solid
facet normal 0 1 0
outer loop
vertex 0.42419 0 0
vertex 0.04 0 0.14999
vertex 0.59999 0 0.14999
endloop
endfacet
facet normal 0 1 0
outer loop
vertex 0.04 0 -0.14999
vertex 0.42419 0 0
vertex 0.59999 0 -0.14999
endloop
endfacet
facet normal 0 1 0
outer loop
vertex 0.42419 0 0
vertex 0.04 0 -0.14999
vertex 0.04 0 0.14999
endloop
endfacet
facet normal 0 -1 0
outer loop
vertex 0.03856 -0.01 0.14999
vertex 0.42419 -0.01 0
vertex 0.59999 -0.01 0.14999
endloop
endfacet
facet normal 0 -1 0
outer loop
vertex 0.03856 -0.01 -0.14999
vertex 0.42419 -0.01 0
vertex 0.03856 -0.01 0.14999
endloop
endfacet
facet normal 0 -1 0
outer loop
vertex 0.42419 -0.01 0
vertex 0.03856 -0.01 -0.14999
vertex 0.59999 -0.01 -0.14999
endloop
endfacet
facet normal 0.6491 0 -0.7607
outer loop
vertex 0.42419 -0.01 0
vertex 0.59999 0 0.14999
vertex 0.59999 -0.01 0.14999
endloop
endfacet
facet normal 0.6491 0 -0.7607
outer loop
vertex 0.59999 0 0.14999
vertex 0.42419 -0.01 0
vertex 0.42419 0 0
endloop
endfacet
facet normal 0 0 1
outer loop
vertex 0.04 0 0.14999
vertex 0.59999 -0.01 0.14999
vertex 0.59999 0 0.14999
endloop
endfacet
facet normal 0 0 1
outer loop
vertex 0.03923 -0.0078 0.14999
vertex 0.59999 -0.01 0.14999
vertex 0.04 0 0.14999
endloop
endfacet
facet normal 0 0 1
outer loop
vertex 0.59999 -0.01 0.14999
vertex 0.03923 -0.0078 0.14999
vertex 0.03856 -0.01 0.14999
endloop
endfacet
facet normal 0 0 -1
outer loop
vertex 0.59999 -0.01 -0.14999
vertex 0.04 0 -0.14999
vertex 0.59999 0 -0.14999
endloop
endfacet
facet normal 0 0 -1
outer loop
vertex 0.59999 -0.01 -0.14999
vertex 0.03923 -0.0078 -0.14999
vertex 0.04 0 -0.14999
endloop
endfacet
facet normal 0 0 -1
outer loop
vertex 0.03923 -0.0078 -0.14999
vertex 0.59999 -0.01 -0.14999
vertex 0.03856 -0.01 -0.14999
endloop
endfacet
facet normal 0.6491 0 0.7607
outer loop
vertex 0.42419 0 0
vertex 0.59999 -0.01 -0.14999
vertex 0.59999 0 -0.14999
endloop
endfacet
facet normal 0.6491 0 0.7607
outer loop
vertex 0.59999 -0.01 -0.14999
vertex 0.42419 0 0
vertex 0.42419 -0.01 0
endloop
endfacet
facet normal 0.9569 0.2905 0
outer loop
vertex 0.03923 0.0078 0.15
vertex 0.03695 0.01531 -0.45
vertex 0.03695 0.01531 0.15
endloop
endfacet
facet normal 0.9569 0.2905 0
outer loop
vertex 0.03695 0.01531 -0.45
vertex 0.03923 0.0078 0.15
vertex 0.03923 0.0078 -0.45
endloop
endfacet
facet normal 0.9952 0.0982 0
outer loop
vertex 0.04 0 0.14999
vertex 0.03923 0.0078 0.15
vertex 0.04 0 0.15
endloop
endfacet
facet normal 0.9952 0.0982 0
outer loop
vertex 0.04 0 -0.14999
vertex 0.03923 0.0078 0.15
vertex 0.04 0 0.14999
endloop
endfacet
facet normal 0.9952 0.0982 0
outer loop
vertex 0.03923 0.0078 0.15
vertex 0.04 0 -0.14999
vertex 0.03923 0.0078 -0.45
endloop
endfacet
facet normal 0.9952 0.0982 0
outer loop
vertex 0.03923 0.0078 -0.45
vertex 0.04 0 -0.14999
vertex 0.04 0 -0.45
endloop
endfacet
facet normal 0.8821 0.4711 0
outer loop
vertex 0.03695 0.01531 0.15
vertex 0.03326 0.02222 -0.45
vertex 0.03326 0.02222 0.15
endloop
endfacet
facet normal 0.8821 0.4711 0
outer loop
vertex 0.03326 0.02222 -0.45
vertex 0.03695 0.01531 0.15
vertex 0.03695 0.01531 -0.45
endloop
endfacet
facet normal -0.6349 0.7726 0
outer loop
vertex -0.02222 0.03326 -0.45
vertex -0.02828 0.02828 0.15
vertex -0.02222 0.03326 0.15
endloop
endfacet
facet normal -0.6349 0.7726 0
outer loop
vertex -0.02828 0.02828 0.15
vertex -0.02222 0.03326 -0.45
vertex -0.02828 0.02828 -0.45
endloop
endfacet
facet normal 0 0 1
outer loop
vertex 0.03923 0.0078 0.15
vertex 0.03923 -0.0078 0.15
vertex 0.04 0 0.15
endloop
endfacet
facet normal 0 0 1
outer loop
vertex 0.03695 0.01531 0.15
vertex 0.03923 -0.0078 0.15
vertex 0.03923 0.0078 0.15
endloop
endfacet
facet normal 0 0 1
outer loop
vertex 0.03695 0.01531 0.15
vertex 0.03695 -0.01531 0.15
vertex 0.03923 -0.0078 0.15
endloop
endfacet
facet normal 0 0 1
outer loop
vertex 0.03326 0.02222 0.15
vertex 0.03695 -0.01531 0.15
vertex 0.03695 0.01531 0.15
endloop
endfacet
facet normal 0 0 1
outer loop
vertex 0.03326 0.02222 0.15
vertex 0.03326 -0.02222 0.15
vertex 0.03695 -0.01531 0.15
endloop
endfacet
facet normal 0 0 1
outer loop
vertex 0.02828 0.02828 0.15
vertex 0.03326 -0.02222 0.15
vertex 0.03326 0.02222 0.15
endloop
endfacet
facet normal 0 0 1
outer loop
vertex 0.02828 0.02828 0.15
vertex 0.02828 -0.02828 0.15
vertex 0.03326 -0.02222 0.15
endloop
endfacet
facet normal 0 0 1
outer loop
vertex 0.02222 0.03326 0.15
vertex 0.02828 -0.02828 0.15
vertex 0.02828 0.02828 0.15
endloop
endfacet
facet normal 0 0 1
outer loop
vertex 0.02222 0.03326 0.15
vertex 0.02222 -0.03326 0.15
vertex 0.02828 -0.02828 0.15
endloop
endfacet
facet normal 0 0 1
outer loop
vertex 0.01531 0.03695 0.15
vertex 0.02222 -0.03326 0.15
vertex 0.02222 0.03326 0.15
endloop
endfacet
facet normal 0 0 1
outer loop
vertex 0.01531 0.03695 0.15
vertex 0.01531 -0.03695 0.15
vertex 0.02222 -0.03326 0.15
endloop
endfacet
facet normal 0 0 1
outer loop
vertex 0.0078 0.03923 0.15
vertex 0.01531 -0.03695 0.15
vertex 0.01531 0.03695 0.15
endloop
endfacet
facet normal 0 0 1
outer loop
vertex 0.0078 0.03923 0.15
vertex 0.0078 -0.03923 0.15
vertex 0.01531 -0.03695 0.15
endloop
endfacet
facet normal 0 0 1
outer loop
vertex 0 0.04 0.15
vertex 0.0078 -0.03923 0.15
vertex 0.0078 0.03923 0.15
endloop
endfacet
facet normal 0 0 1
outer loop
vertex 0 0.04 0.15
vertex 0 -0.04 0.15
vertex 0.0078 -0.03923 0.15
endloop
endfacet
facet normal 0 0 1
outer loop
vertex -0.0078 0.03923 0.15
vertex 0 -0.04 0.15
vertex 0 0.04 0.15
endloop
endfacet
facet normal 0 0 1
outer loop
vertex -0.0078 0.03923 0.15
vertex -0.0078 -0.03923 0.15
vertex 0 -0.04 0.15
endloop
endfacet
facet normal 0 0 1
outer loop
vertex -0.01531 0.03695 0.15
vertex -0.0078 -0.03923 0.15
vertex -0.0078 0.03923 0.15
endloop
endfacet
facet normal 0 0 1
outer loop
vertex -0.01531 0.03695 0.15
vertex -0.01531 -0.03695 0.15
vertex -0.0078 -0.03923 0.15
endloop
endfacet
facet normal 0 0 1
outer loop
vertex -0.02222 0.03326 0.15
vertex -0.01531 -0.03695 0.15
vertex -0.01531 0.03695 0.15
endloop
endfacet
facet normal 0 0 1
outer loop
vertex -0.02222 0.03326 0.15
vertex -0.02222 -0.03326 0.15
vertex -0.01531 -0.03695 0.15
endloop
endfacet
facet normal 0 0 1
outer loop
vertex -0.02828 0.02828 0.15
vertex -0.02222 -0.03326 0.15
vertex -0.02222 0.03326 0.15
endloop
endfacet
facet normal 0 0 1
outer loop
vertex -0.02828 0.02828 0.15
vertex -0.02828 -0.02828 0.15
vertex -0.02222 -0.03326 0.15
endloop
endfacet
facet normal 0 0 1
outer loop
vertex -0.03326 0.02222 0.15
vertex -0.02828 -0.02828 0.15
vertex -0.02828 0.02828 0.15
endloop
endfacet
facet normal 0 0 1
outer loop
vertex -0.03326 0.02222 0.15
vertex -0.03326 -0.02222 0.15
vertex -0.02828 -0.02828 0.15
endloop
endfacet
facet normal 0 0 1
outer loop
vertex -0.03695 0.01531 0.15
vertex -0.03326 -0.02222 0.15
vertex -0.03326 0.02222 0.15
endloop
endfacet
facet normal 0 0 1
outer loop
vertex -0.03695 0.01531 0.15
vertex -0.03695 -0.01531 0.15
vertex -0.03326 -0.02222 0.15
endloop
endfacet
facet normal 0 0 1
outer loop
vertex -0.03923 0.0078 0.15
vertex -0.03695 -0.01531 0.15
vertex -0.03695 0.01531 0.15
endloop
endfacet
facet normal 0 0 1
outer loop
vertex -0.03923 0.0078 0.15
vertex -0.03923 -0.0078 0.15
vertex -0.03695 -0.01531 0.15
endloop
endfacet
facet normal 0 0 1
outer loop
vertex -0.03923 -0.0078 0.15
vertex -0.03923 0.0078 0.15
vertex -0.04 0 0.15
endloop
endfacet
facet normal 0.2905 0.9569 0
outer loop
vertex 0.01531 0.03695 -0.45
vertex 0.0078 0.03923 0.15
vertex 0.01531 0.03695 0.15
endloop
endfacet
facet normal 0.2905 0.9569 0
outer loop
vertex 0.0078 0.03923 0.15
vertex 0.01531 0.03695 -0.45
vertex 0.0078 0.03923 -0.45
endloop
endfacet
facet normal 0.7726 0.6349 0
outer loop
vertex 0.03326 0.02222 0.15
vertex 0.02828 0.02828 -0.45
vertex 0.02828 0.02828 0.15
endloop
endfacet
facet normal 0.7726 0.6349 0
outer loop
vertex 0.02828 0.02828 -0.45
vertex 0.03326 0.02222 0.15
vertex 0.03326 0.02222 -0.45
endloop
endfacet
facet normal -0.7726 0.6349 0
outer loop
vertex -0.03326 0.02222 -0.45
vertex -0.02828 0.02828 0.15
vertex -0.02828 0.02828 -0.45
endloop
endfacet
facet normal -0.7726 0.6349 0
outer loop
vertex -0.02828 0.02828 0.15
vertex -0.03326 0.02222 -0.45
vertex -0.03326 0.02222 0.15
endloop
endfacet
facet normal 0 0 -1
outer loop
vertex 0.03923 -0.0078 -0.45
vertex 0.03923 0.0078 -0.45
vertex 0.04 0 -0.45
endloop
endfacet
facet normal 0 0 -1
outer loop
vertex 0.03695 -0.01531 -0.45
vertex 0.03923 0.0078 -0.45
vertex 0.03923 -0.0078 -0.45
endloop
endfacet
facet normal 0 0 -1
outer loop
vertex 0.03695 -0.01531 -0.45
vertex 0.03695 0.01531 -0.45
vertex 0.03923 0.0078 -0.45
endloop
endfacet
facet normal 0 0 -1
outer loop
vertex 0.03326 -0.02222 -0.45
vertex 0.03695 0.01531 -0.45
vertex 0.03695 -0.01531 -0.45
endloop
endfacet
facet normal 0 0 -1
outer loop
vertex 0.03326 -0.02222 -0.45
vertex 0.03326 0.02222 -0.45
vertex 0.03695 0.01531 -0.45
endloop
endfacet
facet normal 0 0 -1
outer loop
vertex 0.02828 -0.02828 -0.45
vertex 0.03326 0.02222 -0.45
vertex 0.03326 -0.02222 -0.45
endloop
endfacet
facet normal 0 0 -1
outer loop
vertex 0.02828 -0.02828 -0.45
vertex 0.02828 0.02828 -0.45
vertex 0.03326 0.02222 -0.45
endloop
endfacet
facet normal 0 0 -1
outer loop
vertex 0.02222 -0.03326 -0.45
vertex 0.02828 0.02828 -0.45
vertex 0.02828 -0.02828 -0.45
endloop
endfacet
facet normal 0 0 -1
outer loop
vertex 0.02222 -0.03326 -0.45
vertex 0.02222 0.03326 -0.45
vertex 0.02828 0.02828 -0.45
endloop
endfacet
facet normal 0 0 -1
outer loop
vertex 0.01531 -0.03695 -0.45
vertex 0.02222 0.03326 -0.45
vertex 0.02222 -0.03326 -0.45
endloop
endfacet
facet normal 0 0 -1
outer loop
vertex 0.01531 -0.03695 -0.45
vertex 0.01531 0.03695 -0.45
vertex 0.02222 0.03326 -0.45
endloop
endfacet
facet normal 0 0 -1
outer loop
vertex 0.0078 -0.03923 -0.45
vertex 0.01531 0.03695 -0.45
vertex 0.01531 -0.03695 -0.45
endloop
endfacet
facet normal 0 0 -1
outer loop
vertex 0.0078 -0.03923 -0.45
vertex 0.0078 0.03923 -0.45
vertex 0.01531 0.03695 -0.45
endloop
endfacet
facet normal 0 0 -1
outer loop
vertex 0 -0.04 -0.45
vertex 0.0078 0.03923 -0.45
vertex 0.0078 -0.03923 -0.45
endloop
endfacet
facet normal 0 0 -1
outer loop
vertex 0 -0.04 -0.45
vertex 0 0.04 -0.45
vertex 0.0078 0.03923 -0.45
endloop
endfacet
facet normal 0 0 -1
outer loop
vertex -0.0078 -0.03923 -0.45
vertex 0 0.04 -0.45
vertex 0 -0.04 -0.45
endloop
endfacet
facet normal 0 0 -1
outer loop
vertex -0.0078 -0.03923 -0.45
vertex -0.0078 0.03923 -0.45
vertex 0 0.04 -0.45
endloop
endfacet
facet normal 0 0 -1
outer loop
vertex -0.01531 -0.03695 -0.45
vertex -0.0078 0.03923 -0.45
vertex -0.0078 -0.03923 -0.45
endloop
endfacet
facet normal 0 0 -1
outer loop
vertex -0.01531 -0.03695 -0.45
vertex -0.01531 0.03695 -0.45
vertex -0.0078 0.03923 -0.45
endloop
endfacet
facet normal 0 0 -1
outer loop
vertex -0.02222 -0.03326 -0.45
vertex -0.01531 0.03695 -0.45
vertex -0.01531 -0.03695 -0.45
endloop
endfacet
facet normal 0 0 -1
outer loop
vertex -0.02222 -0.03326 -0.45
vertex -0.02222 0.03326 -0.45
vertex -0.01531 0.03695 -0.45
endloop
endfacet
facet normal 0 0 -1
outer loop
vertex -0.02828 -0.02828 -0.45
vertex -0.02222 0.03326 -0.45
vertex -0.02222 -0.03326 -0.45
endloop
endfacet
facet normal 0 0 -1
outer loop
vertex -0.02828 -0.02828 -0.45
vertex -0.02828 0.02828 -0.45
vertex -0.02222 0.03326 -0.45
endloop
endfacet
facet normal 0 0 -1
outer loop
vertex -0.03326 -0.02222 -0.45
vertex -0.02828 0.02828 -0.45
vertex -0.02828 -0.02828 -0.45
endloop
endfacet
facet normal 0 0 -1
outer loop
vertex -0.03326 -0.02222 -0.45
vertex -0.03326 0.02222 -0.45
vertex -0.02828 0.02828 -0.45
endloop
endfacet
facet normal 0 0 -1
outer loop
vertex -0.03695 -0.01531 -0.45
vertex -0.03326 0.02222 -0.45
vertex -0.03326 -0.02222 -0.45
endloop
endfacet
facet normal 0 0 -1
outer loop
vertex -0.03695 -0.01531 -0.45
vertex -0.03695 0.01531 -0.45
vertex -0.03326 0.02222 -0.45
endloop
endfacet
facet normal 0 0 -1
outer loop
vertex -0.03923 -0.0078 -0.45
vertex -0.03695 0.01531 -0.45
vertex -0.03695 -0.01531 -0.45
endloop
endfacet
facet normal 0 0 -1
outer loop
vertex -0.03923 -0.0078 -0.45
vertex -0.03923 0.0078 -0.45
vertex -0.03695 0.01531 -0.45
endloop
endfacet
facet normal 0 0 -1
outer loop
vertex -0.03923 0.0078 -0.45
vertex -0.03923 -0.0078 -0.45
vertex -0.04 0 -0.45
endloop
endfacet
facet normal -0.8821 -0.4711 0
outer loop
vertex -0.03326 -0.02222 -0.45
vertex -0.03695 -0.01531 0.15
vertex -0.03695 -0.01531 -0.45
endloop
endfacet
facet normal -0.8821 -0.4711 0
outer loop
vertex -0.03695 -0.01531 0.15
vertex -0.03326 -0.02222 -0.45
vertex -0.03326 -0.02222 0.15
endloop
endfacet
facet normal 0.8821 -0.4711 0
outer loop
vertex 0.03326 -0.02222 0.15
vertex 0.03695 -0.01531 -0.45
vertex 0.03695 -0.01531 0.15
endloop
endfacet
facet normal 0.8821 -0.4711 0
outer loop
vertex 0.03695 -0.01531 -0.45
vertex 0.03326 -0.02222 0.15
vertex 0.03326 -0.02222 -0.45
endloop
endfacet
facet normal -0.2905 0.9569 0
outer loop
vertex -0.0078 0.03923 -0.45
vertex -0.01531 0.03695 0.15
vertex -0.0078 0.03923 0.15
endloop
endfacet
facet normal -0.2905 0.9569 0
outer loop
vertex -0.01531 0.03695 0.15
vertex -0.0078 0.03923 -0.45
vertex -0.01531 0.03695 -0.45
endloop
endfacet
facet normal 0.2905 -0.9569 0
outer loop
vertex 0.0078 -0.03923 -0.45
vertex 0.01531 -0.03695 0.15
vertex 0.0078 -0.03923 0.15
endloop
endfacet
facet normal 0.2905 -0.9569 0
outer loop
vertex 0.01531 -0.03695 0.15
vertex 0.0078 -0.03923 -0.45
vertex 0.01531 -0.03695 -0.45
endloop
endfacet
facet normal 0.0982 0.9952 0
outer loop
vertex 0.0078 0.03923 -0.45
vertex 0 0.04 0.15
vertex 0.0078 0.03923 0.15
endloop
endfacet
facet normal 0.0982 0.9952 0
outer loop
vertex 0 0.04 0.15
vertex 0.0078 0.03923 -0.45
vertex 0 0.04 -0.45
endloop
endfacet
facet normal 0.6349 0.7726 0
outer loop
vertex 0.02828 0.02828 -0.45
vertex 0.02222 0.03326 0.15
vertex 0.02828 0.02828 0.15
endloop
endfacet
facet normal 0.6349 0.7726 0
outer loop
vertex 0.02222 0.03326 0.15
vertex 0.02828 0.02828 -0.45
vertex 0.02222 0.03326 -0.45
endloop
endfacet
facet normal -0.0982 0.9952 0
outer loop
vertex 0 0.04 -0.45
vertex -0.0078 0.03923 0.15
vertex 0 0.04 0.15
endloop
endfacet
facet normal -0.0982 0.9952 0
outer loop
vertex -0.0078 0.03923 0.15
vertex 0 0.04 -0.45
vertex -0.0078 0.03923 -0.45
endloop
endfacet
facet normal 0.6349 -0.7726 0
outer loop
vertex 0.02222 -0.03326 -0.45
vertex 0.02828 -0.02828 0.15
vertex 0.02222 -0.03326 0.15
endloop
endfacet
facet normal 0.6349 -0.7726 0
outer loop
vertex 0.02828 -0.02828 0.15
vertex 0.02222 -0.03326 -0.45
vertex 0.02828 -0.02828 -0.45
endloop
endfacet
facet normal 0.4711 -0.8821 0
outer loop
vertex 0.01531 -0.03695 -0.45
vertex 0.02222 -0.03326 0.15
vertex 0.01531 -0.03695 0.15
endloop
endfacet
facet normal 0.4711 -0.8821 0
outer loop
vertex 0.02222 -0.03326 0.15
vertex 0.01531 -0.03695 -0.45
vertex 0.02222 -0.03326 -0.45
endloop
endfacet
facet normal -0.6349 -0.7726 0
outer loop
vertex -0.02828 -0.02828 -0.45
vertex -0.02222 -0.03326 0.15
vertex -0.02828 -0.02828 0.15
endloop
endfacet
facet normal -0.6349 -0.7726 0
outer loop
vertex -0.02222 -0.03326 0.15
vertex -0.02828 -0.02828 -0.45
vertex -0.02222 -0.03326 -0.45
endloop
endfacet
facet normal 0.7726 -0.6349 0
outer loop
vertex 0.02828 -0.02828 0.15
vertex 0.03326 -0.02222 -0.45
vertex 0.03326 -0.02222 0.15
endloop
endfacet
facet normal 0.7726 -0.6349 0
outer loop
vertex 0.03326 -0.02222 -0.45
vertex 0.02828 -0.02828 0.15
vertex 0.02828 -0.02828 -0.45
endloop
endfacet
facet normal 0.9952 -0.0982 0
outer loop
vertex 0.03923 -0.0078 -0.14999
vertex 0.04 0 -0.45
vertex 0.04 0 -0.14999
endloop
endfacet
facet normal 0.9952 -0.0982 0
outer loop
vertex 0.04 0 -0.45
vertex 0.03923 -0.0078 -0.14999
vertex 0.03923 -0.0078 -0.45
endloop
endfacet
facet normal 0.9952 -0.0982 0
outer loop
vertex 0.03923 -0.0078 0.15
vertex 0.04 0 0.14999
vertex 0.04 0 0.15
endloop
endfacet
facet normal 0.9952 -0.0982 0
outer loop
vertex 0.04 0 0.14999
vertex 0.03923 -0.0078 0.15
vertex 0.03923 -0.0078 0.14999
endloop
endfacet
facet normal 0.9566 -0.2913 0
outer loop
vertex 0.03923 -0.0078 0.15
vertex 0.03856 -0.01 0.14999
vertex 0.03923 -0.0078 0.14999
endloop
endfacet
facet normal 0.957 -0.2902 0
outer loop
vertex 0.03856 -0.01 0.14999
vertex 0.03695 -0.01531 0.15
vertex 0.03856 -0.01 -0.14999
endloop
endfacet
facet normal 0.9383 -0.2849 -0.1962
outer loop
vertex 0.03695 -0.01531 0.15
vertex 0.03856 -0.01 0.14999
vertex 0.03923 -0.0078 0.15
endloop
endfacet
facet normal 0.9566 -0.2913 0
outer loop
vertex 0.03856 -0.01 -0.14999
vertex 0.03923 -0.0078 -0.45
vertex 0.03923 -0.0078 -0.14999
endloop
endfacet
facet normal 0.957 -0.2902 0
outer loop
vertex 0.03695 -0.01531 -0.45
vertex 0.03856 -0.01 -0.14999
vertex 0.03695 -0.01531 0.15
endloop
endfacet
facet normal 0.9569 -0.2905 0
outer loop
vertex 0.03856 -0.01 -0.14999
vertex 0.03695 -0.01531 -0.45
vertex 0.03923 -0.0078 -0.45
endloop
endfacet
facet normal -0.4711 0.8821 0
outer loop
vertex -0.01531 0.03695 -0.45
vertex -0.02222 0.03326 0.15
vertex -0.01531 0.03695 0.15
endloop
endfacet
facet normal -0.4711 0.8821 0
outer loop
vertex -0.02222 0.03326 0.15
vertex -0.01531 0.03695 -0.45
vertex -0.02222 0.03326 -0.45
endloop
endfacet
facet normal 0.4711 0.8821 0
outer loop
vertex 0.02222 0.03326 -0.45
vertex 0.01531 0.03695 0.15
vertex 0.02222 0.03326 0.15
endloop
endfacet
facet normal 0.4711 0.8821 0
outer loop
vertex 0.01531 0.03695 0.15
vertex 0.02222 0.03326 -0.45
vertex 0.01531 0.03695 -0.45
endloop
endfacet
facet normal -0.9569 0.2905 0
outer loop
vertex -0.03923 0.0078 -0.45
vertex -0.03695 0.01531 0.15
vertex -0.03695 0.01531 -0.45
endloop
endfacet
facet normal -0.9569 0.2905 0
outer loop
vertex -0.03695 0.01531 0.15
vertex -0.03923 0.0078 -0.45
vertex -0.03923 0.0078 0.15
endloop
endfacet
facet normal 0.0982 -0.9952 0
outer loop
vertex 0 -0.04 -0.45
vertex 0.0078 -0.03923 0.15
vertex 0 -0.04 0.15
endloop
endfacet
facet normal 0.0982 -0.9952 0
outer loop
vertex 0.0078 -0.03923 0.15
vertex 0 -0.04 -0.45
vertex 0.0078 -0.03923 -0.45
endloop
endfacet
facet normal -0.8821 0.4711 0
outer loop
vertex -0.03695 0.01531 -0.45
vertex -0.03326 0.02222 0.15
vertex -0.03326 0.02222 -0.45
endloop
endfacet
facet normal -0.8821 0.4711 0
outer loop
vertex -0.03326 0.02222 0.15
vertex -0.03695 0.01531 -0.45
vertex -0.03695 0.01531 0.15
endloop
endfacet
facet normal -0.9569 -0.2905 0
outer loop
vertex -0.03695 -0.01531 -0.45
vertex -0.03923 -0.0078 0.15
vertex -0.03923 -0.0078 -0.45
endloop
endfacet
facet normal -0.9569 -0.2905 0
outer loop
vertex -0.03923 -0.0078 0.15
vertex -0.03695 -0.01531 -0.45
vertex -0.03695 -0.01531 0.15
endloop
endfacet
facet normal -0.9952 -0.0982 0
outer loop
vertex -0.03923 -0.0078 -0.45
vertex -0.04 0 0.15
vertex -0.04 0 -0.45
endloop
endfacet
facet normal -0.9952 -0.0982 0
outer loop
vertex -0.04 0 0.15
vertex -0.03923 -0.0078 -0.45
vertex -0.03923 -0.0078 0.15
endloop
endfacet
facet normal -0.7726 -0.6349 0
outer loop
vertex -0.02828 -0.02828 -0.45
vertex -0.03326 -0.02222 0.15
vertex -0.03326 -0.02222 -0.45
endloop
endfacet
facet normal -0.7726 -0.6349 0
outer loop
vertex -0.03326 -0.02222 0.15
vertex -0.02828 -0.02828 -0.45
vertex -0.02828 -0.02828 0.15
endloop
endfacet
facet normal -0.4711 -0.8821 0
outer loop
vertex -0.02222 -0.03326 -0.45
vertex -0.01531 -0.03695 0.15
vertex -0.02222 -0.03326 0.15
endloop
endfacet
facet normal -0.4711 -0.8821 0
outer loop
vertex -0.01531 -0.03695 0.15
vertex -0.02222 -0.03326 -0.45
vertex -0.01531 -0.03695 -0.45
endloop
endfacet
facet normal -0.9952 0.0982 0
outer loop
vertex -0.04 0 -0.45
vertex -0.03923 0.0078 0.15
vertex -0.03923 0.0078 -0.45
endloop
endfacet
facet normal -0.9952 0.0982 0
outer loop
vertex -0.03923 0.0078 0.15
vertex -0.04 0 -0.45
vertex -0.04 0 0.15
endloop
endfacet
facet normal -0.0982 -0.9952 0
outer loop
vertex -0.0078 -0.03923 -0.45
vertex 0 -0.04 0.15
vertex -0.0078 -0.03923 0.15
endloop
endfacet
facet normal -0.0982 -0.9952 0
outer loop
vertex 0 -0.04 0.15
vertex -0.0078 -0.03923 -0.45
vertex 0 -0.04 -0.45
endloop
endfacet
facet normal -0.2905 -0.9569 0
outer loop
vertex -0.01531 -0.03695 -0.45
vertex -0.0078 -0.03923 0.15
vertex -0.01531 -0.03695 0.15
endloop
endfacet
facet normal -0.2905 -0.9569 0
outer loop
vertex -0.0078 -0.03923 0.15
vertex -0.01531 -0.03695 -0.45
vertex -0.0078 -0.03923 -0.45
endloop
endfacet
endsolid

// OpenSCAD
module praporek(vyska,sirka,tloustka=0.01,tycka=0.04) {
  v2 = vyska/2;
  s2 = sirka*0.707;
  rotate(90, [1,0,0])
  linear_extrude(height=tloustka) polygon(points=[[0,-v2], [0,v2], [sirka,v2], [s2,0], [sirka,-v2]]);
  translate([0,0,-1.5*vyska]) cylinder(2*vyska,tycka,tycka,$fn=32);
}

praporek(0.3,0.6);
